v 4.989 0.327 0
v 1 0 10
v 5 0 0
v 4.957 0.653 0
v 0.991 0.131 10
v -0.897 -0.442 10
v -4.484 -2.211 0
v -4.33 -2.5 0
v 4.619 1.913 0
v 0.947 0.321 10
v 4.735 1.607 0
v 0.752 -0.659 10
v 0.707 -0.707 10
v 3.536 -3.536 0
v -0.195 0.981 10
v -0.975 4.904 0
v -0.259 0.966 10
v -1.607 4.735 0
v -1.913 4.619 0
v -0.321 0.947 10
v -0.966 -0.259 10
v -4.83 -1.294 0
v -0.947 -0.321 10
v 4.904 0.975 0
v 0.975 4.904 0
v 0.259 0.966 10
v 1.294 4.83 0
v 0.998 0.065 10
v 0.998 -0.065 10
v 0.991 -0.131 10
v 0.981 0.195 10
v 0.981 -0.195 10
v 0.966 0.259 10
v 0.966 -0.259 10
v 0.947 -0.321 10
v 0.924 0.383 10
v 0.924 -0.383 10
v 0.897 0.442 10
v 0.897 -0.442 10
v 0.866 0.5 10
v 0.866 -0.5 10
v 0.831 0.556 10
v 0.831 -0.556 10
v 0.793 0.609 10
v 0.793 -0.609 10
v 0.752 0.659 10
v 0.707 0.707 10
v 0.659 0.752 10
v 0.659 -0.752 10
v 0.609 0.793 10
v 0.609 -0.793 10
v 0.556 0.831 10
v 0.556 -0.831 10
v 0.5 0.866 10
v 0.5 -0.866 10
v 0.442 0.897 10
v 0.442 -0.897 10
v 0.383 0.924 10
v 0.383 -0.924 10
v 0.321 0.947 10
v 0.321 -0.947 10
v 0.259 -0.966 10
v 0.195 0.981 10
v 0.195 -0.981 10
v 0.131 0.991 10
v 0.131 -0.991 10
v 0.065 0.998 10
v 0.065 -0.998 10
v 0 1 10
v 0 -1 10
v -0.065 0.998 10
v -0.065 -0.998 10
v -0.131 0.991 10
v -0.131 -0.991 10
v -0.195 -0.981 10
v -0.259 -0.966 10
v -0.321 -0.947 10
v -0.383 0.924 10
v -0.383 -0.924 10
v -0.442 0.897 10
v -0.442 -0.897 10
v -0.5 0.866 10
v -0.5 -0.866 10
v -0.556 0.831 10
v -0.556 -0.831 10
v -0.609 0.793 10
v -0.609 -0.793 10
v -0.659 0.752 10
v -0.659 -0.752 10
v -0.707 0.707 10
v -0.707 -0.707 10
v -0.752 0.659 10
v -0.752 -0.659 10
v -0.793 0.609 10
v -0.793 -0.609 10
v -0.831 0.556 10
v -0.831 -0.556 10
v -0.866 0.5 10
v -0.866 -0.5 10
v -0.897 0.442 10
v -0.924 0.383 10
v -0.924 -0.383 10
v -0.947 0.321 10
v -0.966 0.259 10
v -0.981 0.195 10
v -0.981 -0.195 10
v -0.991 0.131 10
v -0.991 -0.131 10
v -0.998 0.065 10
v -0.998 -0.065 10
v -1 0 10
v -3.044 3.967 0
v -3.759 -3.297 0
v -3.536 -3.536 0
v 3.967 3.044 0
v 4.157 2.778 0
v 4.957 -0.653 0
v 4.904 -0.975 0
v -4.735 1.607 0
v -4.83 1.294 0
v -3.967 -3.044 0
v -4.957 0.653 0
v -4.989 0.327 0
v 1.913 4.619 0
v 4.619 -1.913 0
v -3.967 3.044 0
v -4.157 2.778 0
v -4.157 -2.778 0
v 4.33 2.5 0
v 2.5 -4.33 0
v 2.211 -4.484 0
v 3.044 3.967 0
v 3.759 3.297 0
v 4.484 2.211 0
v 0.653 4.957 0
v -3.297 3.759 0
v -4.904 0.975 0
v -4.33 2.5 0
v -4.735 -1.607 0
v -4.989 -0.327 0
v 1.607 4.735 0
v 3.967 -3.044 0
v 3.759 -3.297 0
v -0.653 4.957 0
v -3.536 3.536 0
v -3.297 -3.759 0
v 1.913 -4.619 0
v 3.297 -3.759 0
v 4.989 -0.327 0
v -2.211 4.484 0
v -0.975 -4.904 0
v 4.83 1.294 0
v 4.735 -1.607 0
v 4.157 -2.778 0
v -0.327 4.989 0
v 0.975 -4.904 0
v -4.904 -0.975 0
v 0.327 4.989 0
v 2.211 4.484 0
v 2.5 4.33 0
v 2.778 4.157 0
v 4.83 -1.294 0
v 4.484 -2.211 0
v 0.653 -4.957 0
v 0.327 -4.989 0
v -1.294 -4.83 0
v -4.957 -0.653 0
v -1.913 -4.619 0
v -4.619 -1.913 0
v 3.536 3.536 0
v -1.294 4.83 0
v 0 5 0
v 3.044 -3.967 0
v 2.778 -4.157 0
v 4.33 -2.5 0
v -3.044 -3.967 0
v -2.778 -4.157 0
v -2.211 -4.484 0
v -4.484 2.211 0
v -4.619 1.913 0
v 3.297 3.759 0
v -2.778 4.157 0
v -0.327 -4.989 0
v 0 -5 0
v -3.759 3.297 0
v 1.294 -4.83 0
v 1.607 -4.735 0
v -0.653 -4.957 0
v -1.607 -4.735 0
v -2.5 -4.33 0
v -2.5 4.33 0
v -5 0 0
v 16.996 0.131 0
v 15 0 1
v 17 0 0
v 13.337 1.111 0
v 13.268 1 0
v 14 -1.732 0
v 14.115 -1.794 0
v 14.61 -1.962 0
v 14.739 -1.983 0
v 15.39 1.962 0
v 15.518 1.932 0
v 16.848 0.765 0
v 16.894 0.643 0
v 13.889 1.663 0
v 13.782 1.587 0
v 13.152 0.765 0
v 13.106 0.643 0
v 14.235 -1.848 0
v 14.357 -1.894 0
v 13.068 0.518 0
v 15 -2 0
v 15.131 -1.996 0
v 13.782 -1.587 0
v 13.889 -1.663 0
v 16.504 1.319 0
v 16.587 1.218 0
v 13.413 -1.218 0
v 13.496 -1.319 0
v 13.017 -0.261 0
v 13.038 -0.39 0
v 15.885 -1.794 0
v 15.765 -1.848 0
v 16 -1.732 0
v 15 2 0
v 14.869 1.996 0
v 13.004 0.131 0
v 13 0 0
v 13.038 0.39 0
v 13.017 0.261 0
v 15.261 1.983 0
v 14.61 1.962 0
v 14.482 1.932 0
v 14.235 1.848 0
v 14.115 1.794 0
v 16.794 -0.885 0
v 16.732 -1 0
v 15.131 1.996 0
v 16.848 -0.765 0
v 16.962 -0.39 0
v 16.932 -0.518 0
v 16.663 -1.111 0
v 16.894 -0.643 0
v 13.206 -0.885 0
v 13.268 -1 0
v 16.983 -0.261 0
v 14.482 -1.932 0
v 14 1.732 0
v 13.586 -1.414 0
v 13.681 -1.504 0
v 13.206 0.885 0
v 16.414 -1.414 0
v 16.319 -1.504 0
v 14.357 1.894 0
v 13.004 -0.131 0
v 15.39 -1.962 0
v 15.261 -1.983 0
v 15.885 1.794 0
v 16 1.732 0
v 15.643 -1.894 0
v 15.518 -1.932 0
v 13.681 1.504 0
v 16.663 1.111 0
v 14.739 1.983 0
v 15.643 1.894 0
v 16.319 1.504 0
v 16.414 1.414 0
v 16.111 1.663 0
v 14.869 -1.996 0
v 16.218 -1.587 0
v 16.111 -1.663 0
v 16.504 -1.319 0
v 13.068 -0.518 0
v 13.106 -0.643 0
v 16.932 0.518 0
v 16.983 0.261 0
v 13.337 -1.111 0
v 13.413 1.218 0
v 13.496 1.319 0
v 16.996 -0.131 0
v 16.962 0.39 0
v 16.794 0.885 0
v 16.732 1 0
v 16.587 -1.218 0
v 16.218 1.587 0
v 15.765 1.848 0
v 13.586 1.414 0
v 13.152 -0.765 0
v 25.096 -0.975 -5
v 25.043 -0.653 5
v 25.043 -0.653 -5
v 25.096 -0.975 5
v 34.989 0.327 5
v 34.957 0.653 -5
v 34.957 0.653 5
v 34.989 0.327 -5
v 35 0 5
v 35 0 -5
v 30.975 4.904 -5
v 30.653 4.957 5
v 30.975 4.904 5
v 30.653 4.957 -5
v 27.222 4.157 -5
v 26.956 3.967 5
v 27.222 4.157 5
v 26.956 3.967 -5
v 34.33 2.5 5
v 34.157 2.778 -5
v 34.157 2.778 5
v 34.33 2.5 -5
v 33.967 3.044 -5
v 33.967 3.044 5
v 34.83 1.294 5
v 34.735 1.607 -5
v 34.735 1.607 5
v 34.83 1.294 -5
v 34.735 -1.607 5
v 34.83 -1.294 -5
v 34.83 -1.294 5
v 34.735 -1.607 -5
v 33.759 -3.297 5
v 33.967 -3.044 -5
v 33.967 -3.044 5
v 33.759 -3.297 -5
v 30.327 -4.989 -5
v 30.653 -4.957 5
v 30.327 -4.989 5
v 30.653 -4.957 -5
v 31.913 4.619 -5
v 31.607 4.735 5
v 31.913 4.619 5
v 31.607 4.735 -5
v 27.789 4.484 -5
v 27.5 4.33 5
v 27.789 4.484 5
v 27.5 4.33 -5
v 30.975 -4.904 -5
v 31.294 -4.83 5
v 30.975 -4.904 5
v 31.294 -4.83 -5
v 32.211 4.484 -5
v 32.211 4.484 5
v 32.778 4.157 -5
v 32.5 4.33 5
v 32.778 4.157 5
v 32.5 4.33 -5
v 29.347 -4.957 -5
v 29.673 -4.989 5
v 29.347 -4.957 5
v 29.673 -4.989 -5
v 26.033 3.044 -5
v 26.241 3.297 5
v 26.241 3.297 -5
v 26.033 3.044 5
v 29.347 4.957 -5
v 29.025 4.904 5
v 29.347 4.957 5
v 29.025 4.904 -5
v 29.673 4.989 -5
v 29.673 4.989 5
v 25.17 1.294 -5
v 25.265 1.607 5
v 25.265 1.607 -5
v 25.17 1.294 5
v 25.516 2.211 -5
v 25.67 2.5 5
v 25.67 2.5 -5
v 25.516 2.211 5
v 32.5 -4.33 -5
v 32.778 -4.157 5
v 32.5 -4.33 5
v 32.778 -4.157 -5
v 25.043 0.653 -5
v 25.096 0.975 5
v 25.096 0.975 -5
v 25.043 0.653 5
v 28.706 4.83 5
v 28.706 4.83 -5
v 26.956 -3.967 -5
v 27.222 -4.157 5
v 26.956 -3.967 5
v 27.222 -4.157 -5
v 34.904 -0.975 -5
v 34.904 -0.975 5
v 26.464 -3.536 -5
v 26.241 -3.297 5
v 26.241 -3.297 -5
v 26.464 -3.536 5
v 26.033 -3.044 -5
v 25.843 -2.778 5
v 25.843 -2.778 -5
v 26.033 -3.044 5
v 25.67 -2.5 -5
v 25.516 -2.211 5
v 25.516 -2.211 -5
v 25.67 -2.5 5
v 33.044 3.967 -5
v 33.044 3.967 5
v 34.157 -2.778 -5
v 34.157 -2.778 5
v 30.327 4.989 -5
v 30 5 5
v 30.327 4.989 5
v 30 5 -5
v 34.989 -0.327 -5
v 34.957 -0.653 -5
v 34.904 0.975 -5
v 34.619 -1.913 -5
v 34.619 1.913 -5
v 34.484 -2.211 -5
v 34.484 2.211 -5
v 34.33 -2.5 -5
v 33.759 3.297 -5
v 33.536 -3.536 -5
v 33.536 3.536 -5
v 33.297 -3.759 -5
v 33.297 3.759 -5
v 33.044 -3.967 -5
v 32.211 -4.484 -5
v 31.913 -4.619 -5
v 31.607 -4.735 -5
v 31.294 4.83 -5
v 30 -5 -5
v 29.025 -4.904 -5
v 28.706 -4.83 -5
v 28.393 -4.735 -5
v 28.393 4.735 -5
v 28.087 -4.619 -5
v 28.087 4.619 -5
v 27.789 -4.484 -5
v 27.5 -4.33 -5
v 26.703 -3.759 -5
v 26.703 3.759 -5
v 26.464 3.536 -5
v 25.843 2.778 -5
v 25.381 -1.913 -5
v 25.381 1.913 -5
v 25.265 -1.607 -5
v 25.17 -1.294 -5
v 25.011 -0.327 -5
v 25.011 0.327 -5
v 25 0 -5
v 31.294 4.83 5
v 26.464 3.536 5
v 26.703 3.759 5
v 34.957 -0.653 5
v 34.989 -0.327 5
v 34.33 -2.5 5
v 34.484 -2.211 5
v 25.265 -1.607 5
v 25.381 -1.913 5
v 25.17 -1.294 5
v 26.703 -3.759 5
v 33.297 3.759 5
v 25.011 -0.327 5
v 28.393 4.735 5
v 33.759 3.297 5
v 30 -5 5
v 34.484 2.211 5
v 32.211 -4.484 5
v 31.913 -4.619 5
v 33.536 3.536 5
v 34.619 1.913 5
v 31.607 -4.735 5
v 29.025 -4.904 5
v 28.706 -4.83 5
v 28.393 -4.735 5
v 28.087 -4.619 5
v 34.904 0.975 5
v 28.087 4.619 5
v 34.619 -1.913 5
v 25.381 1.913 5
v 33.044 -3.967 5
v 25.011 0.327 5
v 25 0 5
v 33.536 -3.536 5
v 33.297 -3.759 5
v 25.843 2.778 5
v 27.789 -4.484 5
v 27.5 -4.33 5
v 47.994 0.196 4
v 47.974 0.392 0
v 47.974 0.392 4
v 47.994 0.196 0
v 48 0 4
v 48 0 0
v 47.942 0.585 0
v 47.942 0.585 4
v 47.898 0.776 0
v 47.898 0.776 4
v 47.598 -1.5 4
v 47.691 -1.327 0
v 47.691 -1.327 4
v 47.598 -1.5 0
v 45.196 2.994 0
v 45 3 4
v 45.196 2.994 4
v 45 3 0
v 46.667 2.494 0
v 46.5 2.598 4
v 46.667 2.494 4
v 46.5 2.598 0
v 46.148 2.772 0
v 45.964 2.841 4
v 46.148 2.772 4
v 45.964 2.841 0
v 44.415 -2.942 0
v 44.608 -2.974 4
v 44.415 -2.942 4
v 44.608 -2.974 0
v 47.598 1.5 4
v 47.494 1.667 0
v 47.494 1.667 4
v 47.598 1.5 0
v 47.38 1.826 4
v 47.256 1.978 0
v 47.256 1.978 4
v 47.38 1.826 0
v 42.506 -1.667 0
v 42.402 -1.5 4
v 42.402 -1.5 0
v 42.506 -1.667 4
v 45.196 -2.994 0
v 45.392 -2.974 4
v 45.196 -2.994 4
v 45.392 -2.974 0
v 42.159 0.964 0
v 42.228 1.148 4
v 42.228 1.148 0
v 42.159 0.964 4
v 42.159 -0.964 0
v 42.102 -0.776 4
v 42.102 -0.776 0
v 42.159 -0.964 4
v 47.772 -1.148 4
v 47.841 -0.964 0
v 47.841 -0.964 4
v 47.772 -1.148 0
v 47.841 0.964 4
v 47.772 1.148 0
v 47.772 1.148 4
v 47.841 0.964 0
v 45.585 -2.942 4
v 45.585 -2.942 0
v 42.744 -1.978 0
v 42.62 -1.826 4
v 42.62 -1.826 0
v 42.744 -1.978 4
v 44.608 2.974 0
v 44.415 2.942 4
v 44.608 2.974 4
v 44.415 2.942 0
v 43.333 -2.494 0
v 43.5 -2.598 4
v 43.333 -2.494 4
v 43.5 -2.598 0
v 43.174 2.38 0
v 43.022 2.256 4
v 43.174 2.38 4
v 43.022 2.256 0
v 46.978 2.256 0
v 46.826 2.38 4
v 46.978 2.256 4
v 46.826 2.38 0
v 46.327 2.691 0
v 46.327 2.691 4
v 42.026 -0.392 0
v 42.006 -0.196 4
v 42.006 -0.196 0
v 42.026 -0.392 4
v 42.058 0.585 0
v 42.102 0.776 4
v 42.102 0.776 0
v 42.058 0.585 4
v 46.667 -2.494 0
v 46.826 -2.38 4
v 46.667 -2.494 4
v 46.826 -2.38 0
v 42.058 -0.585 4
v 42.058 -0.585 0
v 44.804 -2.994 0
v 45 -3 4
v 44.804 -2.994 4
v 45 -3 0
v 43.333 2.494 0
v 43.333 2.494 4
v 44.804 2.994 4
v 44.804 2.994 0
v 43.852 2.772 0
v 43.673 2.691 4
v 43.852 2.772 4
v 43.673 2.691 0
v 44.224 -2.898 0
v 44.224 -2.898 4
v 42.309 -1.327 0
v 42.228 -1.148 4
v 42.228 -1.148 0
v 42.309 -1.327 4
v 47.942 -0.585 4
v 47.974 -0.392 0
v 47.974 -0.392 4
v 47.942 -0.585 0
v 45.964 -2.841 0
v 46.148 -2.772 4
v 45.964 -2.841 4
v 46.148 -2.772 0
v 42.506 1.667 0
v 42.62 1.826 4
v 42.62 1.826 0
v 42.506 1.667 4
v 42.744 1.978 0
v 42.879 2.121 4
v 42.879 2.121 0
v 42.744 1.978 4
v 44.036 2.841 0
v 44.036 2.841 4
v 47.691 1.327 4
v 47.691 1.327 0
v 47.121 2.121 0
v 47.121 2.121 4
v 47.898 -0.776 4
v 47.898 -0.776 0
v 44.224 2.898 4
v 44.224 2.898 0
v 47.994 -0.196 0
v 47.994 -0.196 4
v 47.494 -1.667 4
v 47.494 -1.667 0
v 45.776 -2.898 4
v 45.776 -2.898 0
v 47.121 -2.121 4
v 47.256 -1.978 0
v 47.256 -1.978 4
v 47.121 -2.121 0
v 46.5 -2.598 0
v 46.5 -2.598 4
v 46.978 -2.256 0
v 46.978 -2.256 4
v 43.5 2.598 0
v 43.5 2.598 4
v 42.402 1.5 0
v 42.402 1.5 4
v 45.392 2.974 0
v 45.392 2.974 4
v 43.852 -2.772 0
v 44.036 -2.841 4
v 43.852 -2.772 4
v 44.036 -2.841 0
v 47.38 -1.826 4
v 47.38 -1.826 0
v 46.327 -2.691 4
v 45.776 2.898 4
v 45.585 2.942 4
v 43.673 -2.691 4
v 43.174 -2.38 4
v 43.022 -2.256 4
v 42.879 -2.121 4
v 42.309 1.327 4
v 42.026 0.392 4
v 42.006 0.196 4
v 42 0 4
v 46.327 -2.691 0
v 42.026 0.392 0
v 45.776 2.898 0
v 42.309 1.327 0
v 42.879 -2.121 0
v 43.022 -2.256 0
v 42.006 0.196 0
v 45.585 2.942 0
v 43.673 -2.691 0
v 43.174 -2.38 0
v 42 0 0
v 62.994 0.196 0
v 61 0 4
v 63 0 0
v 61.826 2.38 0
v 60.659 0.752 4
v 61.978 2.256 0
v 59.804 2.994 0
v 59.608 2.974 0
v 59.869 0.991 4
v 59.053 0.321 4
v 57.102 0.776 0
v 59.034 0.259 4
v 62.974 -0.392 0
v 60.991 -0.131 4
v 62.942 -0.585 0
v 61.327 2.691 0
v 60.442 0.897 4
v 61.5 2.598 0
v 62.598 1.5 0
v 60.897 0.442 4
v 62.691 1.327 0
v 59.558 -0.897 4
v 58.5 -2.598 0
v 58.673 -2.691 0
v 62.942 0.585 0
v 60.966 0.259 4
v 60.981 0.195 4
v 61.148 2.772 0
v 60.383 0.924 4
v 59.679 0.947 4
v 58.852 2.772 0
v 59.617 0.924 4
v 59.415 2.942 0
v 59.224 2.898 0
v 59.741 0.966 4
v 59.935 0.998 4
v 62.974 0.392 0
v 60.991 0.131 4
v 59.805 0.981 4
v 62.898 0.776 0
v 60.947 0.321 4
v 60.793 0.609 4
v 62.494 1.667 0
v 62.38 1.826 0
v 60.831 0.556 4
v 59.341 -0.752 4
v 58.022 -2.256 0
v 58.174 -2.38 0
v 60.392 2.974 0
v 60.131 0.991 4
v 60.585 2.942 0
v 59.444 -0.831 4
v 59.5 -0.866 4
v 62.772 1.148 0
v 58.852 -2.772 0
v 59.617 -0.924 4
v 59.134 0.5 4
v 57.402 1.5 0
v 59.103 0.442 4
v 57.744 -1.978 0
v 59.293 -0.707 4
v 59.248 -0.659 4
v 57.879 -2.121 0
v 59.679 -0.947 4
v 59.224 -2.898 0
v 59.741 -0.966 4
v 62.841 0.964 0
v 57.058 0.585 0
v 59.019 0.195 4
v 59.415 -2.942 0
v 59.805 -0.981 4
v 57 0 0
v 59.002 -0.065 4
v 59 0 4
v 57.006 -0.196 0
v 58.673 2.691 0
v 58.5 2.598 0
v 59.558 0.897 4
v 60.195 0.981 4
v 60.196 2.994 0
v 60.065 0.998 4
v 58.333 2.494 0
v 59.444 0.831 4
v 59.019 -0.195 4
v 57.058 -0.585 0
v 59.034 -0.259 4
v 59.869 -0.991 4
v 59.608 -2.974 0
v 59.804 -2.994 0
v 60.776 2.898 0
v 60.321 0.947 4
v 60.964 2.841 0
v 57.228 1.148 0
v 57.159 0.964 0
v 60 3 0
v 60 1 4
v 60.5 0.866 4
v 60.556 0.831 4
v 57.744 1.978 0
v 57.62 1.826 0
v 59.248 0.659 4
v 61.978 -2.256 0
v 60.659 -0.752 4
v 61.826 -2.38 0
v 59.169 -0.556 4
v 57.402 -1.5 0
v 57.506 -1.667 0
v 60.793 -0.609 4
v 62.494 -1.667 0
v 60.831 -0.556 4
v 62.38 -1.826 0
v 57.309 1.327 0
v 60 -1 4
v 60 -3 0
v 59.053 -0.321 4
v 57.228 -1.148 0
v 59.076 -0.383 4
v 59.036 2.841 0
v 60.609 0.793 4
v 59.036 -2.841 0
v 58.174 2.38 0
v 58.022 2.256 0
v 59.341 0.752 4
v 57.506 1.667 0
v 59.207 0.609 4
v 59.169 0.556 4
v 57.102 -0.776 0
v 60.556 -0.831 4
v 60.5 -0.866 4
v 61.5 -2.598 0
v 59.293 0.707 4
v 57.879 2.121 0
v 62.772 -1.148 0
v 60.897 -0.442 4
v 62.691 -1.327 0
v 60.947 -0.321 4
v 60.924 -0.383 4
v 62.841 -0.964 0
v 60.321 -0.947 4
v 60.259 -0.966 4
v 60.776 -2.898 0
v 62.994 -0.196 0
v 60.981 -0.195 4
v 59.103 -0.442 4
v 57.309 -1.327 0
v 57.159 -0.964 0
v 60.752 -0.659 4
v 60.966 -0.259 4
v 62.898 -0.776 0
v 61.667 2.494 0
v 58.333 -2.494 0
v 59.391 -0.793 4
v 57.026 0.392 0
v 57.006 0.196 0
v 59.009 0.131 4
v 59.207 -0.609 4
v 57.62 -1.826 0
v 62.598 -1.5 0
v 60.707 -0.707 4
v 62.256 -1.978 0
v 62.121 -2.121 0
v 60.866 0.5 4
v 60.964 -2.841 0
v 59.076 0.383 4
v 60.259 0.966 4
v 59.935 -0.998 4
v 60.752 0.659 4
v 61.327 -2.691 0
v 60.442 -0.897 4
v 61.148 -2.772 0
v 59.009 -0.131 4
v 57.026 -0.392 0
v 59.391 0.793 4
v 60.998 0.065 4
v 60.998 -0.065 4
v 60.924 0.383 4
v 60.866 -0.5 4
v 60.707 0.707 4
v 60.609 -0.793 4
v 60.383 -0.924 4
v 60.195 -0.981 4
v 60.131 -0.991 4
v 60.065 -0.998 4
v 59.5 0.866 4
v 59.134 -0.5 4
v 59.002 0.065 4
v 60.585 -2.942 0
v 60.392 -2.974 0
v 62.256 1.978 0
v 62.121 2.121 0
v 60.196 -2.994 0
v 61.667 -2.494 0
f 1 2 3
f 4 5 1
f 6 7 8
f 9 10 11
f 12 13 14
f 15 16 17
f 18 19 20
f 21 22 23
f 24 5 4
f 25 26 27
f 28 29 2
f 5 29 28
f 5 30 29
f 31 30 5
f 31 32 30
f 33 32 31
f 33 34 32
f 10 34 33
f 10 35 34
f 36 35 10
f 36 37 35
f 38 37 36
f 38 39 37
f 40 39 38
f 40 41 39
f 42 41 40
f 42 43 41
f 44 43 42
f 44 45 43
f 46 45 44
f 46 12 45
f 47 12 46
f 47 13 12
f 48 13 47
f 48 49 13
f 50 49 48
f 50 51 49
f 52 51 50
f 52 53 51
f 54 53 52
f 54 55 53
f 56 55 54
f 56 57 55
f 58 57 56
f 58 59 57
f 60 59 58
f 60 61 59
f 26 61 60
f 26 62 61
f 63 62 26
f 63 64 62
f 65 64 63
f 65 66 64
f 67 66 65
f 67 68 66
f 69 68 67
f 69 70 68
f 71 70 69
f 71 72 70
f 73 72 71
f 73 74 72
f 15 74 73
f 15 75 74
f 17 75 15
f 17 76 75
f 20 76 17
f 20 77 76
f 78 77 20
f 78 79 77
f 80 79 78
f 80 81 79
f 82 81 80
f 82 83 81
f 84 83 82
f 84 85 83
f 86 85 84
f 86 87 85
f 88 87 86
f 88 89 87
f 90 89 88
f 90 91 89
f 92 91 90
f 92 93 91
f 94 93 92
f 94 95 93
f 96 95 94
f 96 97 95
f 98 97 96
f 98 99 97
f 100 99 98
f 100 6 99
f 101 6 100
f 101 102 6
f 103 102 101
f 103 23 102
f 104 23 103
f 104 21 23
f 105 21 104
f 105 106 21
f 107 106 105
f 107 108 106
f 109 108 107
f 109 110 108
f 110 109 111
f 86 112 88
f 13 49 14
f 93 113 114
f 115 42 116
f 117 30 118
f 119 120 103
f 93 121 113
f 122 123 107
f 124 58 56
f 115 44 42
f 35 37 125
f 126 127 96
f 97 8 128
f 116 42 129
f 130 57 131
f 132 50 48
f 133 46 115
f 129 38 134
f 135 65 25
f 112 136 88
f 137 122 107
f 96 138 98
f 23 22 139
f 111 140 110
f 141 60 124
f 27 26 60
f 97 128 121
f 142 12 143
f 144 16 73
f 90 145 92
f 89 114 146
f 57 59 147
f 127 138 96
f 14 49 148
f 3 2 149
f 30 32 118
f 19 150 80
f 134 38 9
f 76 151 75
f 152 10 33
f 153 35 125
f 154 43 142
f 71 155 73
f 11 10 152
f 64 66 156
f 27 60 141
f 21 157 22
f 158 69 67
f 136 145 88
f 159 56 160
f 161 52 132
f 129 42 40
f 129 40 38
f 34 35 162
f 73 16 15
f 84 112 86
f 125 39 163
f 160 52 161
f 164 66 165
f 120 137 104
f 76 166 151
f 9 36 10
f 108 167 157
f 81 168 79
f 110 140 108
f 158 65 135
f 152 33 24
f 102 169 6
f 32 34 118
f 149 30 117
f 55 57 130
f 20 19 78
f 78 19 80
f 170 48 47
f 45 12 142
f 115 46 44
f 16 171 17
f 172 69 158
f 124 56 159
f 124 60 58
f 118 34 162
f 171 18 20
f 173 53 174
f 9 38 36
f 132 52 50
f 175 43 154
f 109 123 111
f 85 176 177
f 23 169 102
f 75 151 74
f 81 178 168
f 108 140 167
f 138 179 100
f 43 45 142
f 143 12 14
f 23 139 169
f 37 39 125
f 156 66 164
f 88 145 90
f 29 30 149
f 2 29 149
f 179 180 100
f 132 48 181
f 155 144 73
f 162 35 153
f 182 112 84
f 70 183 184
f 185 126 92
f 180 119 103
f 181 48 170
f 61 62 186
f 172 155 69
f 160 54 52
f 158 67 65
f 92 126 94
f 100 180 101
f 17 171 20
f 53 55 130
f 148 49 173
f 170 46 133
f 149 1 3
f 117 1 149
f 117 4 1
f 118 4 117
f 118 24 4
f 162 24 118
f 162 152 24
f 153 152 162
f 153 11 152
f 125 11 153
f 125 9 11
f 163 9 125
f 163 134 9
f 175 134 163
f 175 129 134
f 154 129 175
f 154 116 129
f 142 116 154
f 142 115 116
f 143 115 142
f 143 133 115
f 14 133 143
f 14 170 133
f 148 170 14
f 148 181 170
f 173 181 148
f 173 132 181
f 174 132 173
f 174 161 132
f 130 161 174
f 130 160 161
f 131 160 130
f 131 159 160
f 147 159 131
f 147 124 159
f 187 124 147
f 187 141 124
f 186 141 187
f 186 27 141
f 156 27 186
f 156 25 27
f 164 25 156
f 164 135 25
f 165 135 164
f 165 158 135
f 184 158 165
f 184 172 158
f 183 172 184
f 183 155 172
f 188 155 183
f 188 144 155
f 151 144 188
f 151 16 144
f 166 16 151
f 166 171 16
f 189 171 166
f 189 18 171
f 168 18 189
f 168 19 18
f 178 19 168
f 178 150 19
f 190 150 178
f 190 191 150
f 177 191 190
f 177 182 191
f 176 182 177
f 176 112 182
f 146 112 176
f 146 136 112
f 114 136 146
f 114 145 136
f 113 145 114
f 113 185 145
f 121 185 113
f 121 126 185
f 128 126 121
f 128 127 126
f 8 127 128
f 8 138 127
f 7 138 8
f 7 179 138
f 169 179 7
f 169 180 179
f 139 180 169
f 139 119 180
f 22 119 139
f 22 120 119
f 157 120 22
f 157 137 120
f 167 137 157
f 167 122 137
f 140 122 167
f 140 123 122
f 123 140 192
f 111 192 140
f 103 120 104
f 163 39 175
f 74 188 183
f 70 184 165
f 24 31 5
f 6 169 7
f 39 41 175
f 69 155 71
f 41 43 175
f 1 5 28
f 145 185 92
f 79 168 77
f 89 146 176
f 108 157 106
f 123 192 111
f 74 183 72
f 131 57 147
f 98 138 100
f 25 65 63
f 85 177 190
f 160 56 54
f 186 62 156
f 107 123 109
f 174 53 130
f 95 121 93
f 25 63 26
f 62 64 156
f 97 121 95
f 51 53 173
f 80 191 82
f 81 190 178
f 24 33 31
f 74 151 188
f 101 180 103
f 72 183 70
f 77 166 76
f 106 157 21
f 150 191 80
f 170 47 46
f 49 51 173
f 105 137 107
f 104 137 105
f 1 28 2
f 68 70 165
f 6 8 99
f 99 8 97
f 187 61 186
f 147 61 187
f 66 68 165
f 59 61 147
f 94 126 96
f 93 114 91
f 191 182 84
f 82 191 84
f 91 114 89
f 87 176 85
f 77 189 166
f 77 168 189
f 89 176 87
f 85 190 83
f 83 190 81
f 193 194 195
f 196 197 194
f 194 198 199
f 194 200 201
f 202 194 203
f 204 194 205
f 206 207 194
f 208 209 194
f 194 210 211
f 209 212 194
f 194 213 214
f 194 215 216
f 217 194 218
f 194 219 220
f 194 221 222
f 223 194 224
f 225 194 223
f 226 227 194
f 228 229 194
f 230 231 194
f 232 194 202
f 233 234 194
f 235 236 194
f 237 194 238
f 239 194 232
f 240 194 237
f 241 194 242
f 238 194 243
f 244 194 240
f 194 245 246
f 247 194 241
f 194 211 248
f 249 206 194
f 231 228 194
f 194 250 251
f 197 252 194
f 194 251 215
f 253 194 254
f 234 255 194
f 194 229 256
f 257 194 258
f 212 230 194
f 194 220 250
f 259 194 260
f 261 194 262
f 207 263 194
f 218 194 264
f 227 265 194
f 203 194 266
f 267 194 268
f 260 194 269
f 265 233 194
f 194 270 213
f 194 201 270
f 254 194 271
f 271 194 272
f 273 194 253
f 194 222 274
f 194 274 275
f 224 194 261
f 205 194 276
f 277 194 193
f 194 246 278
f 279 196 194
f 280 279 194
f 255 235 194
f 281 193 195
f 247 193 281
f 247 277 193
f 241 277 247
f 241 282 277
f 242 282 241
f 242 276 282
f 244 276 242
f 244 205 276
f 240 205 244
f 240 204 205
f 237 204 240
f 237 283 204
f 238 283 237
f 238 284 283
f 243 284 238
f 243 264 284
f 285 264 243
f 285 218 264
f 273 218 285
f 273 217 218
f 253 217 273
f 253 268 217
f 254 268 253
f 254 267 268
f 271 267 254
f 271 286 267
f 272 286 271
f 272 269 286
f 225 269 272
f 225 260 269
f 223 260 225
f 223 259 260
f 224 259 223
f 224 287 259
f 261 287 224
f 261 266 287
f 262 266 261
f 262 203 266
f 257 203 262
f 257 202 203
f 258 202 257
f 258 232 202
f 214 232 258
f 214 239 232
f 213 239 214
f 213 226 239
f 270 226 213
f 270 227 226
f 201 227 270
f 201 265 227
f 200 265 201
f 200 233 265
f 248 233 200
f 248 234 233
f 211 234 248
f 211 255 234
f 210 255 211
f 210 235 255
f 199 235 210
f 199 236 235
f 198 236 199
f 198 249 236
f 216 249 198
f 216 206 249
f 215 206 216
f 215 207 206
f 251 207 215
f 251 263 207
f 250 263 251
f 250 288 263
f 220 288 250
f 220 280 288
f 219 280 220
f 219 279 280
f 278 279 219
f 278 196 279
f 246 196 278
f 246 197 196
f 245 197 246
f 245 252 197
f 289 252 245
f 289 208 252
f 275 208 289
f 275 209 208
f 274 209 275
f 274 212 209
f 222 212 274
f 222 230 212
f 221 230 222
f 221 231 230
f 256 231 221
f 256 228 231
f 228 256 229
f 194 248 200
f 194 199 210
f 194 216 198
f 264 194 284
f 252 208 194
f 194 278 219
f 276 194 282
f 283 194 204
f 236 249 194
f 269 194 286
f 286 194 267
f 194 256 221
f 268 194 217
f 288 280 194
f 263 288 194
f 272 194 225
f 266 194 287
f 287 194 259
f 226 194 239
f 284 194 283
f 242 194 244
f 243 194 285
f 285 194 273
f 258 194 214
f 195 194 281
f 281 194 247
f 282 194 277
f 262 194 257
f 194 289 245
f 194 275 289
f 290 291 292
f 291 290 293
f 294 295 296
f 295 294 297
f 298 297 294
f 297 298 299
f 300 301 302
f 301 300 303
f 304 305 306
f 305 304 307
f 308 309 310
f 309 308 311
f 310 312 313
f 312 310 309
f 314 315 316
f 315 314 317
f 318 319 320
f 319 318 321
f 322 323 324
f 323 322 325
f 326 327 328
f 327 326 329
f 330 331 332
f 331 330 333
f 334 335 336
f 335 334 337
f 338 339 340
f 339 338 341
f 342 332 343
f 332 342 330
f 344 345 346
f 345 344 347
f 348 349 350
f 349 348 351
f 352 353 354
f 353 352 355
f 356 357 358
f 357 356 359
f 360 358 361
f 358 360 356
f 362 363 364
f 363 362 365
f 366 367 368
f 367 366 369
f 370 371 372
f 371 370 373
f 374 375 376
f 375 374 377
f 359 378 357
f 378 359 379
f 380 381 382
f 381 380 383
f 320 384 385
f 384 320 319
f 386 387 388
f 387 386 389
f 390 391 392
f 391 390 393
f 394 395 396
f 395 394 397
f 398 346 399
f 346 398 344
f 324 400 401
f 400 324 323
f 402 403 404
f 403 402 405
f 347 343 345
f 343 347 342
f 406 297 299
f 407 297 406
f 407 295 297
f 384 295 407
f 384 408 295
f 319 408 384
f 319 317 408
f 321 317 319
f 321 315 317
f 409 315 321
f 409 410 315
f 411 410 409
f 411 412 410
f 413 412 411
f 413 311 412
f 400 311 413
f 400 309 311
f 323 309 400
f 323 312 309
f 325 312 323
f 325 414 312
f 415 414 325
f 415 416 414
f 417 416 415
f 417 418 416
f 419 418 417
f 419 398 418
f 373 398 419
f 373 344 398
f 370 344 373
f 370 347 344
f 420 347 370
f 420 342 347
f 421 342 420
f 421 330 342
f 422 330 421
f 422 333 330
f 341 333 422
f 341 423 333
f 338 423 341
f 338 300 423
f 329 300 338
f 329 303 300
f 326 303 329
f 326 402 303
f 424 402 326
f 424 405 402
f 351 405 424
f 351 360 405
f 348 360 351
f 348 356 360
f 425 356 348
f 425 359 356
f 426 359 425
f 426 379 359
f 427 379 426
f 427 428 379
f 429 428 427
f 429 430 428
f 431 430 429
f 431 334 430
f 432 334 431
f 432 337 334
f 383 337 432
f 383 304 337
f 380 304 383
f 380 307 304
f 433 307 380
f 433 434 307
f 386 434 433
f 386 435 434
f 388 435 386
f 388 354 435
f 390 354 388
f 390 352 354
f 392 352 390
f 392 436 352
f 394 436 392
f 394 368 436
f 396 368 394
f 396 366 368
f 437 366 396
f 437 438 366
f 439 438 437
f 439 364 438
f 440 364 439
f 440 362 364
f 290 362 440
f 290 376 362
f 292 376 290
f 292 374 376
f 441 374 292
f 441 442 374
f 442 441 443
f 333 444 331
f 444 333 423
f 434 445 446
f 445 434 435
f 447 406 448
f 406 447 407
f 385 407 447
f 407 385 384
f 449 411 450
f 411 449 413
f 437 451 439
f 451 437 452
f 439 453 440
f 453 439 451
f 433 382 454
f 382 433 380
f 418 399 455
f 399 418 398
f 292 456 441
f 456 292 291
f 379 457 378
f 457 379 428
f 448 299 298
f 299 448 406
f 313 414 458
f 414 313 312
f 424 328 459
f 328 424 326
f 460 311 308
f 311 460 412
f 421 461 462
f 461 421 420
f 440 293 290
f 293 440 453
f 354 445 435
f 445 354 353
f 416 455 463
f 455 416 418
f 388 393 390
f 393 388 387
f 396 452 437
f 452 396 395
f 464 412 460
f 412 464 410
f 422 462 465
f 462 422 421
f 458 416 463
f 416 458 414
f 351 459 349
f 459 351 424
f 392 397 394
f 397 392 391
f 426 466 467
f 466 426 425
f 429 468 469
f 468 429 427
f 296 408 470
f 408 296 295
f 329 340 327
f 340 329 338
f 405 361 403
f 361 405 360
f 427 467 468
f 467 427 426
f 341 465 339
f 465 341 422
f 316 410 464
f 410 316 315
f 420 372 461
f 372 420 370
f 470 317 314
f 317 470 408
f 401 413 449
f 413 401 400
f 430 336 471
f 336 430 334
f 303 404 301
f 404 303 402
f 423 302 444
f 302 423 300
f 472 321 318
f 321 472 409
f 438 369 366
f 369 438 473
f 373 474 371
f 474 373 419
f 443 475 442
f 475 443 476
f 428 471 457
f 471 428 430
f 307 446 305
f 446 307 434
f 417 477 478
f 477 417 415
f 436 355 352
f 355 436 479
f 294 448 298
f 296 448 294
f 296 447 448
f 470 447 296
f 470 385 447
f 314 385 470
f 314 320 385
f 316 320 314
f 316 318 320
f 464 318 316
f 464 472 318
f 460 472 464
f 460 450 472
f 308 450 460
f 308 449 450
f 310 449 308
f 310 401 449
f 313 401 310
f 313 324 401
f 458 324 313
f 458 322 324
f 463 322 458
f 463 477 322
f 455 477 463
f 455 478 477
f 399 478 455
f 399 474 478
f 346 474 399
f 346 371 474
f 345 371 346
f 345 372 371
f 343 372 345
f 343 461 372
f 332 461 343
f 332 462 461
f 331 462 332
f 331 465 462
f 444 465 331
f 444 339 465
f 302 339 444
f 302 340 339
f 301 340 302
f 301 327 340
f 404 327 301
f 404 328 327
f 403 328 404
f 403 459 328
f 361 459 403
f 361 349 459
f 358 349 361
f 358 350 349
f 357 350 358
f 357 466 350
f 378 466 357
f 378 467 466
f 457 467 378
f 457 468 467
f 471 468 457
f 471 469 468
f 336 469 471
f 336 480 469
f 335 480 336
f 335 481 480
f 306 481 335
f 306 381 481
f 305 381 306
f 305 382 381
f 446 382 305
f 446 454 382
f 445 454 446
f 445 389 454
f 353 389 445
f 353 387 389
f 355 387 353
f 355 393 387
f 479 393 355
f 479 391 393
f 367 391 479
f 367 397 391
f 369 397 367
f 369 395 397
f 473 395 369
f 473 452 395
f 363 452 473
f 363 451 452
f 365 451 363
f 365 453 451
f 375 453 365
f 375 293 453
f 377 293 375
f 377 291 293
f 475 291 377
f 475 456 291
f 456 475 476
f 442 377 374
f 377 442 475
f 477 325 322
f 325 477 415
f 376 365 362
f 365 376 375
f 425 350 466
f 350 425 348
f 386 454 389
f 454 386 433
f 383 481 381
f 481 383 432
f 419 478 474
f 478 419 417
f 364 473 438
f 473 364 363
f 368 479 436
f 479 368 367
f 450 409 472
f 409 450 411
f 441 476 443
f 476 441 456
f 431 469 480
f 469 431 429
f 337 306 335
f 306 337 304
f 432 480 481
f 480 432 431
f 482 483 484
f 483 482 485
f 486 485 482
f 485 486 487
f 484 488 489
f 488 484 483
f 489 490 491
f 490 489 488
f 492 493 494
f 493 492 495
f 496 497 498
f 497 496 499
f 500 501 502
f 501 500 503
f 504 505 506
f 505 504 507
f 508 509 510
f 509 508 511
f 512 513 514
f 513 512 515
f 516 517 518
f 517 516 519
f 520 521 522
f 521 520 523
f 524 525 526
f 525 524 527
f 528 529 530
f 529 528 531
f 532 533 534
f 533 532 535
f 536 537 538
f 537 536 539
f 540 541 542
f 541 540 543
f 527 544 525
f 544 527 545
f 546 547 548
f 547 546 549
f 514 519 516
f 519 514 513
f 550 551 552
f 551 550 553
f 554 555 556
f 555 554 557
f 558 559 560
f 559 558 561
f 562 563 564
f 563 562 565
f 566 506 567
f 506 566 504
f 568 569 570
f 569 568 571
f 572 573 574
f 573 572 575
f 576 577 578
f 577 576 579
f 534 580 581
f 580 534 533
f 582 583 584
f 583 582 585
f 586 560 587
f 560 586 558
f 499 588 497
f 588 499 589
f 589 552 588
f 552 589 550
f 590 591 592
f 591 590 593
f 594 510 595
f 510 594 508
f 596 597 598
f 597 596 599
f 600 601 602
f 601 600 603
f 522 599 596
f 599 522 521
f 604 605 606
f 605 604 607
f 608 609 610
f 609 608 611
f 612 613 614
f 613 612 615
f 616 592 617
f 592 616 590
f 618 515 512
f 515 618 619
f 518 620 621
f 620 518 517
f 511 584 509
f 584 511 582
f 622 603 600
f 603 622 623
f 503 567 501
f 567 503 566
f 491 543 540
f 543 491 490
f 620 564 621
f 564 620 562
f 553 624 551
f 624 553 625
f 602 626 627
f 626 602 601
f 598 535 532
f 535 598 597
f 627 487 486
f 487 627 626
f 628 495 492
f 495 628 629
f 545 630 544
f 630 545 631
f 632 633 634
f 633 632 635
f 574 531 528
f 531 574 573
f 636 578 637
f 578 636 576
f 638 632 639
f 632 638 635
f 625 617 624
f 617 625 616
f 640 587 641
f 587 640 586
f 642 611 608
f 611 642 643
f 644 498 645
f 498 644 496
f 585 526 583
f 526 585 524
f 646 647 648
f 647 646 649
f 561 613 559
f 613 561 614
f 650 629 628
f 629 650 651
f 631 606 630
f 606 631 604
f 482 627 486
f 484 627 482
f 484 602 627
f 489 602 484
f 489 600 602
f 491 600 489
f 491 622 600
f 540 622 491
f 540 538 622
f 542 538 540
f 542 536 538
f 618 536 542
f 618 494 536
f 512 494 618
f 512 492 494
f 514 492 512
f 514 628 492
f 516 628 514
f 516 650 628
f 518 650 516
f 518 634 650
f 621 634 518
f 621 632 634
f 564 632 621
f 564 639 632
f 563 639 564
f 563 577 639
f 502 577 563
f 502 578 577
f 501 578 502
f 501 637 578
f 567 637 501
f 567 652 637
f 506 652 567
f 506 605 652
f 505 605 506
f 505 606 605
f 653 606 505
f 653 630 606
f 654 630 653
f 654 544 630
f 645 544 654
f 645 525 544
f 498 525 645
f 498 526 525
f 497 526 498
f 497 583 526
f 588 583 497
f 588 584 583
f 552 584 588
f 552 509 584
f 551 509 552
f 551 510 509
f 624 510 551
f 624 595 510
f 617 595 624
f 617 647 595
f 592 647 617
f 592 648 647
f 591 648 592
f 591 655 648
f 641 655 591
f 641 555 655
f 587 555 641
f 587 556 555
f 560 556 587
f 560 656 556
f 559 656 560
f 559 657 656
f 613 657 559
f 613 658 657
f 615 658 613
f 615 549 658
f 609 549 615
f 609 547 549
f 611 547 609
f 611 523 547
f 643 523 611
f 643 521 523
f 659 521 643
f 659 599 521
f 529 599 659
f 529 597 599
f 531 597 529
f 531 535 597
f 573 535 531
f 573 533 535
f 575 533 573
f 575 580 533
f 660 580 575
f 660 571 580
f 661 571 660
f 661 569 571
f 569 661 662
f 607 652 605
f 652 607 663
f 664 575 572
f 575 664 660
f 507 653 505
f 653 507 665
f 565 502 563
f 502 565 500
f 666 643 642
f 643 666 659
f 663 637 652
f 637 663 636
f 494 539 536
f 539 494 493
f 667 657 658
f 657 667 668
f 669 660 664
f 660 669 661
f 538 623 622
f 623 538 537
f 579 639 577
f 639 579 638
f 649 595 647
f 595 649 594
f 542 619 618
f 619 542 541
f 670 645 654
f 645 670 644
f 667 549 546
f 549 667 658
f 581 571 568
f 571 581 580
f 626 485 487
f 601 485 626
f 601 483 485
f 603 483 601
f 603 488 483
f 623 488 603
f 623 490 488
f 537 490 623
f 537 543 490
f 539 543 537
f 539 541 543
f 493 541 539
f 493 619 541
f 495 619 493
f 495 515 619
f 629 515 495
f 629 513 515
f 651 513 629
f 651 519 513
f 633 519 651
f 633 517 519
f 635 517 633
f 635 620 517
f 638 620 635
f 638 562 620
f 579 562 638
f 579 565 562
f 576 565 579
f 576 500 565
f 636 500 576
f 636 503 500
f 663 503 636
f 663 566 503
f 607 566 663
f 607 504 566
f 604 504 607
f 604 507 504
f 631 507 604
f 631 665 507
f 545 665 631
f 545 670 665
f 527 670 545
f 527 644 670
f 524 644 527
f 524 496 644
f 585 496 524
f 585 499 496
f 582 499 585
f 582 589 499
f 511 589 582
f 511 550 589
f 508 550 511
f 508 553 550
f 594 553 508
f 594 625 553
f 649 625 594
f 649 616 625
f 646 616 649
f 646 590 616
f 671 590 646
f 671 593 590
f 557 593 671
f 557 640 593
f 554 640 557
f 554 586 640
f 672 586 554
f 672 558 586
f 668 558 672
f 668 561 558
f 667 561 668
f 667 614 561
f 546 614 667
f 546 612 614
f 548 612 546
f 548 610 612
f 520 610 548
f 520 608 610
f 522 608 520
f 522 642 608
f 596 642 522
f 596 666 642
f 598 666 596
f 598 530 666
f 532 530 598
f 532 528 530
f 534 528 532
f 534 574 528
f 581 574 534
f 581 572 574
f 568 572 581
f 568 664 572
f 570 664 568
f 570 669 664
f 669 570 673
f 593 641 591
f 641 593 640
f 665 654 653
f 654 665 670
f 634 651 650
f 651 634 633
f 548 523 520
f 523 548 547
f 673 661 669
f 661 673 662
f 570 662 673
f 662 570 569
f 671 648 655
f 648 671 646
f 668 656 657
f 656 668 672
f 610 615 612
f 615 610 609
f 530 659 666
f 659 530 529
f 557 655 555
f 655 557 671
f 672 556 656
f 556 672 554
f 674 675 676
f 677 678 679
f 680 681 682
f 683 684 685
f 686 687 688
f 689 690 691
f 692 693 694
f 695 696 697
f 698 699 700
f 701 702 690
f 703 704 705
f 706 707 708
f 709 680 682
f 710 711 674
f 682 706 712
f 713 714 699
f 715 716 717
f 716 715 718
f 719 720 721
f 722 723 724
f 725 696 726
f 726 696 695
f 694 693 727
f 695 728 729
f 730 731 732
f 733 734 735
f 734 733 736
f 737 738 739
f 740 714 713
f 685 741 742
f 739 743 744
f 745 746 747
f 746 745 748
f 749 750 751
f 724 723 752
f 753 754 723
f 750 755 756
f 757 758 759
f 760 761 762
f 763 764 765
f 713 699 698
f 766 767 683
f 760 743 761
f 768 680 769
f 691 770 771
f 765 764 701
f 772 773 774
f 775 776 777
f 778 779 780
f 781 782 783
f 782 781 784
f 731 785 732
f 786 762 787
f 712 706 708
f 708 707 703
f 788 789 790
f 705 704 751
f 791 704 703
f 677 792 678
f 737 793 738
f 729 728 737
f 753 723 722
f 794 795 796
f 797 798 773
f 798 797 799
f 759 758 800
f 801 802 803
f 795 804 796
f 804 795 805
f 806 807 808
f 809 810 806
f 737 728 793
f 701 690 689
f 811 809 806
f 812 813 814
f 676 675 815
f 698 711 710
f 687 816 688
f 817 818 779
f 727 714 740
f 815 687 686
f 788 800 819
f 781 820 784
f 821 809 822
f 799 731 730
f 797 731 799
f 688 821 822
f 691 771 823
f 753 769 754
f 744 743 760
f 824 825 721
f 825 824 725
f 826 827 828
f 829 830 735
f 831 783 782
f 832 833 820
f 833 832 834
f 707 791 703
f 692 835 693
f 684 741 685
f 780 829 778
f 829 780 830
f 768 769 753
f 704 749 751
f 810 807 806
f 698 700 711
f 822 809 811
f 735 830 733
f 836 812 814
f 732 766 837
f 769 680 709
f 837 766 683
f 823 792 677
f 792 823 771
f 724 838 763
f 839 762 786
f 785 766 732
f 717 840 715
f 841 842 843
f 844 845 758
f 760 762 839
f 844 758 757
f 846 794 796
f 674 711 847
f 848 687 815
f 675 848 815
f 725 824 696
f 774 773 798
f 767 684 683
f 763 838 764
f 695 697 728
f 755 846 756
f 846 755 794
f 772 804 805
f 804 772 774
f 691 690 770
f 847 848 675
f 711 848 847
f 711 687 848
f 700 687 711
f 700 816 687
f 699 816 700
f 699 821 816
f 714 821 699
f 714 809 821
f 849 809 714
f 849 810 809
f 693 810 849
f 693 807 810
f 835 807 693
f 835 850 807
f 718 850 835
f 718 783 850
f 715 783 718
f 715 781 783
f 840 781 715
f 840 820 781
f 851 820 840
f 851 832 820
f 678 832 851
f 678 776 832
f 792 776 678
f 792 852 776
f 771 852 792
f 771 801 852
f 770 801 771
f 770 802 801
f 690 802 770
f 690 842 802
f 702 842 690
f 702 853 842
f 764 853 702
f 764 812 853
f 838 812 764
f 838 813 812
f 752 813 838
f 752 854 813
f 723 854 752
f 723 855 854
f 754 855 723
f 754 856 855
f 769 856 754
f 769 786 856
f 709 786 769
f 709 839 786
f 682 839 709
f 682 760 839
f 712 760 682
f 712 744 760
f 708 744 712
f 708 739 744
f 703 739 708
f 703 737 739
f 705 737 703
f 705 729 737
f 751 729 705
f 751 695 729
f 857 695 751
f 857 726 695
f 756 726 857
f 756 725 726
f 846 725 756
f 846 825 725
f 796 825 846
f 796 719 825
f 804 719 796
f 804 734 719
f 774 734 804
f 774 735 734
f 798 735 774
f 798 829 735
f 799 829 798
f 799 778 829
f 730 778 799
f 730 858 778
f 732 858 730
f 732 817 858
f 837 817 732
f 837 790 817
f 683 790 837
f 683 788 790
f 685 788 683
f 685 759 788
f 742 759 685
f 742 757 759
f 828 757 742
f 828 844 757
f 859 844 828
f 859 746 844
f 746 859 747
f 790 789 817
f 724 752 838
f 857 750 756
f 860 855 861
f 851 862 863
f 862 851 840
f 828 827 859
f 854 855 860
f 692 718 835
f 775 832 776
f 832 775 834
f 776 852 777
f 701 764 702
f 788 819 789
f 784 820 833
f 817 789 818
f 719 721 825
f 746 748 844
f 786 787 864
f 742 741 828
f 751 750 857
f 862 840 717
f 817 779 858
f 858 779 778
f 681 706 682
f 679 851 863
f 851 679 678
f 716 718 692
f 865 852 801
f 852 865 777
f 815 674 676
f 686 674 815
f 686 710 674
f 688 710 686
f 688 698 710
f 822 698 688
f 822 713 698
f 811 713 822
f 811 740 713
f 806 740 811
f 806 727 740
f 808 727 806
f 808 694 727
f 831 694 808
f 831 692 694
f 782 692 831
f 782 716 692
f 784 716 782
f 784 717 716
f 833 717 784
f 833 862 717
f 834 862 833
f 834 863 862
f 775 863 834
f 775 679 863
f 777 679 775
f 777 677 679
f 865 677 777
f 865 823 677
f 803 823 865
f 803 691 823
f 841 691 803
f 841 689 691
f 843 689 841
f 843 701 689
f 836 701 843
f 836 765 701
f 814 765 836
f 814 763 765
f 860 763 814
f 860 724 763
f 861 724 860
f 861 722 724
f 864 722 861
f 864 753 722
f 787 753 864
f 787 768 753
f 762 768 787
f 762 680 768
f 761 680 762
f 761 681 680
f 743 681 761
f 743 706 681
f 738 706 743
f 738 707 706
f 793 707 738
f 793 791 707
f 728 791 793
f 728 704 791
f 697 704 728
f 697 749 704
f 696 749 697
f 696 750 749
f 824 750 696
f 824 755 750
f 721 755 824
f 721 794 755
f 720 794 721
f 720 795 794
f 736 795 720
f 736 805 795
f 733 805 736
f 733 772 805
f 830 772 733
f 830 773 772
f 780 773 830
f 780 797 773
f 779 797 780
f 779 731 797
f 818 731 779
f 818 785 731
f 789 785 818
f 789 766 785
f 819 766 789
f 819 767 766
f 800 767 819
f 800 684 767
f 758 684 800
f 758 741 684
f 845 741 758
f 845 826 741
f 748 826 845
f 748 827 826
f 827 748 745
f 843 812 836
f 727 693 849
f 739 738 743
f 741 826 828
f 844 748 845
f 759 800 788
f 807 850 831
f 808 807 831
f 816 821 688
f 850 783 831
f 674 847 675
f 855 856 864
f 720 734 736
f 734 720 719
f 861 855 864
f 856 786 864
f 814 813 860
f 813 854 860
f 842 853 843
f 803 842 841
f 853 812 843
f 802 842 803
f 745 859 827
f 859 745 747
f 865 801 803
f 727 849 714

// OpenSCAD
// cylinder's positional order is (h, r1, r2, center) and an unset radius is 1 (thing 3446199):
// cylinder(10, 5) is a cone to r = 1, cylinder(1, 2, 0) a pointed cone, (h, r, r, true) a
// centred cylinder. Radii from variables go through the runtime choice.
$fn = 96;
a = 3;
cylinder(10, 5);
translate([15, 0, 0]) cylinder(1, 2, 0);
translate([30, 0, 0]) cylinder(10, 5, 5, true);
translate([45, 0, 0]) cylinder(4, a, a);
translate([60, 0, 0]) cylinder(4, a, 1);
